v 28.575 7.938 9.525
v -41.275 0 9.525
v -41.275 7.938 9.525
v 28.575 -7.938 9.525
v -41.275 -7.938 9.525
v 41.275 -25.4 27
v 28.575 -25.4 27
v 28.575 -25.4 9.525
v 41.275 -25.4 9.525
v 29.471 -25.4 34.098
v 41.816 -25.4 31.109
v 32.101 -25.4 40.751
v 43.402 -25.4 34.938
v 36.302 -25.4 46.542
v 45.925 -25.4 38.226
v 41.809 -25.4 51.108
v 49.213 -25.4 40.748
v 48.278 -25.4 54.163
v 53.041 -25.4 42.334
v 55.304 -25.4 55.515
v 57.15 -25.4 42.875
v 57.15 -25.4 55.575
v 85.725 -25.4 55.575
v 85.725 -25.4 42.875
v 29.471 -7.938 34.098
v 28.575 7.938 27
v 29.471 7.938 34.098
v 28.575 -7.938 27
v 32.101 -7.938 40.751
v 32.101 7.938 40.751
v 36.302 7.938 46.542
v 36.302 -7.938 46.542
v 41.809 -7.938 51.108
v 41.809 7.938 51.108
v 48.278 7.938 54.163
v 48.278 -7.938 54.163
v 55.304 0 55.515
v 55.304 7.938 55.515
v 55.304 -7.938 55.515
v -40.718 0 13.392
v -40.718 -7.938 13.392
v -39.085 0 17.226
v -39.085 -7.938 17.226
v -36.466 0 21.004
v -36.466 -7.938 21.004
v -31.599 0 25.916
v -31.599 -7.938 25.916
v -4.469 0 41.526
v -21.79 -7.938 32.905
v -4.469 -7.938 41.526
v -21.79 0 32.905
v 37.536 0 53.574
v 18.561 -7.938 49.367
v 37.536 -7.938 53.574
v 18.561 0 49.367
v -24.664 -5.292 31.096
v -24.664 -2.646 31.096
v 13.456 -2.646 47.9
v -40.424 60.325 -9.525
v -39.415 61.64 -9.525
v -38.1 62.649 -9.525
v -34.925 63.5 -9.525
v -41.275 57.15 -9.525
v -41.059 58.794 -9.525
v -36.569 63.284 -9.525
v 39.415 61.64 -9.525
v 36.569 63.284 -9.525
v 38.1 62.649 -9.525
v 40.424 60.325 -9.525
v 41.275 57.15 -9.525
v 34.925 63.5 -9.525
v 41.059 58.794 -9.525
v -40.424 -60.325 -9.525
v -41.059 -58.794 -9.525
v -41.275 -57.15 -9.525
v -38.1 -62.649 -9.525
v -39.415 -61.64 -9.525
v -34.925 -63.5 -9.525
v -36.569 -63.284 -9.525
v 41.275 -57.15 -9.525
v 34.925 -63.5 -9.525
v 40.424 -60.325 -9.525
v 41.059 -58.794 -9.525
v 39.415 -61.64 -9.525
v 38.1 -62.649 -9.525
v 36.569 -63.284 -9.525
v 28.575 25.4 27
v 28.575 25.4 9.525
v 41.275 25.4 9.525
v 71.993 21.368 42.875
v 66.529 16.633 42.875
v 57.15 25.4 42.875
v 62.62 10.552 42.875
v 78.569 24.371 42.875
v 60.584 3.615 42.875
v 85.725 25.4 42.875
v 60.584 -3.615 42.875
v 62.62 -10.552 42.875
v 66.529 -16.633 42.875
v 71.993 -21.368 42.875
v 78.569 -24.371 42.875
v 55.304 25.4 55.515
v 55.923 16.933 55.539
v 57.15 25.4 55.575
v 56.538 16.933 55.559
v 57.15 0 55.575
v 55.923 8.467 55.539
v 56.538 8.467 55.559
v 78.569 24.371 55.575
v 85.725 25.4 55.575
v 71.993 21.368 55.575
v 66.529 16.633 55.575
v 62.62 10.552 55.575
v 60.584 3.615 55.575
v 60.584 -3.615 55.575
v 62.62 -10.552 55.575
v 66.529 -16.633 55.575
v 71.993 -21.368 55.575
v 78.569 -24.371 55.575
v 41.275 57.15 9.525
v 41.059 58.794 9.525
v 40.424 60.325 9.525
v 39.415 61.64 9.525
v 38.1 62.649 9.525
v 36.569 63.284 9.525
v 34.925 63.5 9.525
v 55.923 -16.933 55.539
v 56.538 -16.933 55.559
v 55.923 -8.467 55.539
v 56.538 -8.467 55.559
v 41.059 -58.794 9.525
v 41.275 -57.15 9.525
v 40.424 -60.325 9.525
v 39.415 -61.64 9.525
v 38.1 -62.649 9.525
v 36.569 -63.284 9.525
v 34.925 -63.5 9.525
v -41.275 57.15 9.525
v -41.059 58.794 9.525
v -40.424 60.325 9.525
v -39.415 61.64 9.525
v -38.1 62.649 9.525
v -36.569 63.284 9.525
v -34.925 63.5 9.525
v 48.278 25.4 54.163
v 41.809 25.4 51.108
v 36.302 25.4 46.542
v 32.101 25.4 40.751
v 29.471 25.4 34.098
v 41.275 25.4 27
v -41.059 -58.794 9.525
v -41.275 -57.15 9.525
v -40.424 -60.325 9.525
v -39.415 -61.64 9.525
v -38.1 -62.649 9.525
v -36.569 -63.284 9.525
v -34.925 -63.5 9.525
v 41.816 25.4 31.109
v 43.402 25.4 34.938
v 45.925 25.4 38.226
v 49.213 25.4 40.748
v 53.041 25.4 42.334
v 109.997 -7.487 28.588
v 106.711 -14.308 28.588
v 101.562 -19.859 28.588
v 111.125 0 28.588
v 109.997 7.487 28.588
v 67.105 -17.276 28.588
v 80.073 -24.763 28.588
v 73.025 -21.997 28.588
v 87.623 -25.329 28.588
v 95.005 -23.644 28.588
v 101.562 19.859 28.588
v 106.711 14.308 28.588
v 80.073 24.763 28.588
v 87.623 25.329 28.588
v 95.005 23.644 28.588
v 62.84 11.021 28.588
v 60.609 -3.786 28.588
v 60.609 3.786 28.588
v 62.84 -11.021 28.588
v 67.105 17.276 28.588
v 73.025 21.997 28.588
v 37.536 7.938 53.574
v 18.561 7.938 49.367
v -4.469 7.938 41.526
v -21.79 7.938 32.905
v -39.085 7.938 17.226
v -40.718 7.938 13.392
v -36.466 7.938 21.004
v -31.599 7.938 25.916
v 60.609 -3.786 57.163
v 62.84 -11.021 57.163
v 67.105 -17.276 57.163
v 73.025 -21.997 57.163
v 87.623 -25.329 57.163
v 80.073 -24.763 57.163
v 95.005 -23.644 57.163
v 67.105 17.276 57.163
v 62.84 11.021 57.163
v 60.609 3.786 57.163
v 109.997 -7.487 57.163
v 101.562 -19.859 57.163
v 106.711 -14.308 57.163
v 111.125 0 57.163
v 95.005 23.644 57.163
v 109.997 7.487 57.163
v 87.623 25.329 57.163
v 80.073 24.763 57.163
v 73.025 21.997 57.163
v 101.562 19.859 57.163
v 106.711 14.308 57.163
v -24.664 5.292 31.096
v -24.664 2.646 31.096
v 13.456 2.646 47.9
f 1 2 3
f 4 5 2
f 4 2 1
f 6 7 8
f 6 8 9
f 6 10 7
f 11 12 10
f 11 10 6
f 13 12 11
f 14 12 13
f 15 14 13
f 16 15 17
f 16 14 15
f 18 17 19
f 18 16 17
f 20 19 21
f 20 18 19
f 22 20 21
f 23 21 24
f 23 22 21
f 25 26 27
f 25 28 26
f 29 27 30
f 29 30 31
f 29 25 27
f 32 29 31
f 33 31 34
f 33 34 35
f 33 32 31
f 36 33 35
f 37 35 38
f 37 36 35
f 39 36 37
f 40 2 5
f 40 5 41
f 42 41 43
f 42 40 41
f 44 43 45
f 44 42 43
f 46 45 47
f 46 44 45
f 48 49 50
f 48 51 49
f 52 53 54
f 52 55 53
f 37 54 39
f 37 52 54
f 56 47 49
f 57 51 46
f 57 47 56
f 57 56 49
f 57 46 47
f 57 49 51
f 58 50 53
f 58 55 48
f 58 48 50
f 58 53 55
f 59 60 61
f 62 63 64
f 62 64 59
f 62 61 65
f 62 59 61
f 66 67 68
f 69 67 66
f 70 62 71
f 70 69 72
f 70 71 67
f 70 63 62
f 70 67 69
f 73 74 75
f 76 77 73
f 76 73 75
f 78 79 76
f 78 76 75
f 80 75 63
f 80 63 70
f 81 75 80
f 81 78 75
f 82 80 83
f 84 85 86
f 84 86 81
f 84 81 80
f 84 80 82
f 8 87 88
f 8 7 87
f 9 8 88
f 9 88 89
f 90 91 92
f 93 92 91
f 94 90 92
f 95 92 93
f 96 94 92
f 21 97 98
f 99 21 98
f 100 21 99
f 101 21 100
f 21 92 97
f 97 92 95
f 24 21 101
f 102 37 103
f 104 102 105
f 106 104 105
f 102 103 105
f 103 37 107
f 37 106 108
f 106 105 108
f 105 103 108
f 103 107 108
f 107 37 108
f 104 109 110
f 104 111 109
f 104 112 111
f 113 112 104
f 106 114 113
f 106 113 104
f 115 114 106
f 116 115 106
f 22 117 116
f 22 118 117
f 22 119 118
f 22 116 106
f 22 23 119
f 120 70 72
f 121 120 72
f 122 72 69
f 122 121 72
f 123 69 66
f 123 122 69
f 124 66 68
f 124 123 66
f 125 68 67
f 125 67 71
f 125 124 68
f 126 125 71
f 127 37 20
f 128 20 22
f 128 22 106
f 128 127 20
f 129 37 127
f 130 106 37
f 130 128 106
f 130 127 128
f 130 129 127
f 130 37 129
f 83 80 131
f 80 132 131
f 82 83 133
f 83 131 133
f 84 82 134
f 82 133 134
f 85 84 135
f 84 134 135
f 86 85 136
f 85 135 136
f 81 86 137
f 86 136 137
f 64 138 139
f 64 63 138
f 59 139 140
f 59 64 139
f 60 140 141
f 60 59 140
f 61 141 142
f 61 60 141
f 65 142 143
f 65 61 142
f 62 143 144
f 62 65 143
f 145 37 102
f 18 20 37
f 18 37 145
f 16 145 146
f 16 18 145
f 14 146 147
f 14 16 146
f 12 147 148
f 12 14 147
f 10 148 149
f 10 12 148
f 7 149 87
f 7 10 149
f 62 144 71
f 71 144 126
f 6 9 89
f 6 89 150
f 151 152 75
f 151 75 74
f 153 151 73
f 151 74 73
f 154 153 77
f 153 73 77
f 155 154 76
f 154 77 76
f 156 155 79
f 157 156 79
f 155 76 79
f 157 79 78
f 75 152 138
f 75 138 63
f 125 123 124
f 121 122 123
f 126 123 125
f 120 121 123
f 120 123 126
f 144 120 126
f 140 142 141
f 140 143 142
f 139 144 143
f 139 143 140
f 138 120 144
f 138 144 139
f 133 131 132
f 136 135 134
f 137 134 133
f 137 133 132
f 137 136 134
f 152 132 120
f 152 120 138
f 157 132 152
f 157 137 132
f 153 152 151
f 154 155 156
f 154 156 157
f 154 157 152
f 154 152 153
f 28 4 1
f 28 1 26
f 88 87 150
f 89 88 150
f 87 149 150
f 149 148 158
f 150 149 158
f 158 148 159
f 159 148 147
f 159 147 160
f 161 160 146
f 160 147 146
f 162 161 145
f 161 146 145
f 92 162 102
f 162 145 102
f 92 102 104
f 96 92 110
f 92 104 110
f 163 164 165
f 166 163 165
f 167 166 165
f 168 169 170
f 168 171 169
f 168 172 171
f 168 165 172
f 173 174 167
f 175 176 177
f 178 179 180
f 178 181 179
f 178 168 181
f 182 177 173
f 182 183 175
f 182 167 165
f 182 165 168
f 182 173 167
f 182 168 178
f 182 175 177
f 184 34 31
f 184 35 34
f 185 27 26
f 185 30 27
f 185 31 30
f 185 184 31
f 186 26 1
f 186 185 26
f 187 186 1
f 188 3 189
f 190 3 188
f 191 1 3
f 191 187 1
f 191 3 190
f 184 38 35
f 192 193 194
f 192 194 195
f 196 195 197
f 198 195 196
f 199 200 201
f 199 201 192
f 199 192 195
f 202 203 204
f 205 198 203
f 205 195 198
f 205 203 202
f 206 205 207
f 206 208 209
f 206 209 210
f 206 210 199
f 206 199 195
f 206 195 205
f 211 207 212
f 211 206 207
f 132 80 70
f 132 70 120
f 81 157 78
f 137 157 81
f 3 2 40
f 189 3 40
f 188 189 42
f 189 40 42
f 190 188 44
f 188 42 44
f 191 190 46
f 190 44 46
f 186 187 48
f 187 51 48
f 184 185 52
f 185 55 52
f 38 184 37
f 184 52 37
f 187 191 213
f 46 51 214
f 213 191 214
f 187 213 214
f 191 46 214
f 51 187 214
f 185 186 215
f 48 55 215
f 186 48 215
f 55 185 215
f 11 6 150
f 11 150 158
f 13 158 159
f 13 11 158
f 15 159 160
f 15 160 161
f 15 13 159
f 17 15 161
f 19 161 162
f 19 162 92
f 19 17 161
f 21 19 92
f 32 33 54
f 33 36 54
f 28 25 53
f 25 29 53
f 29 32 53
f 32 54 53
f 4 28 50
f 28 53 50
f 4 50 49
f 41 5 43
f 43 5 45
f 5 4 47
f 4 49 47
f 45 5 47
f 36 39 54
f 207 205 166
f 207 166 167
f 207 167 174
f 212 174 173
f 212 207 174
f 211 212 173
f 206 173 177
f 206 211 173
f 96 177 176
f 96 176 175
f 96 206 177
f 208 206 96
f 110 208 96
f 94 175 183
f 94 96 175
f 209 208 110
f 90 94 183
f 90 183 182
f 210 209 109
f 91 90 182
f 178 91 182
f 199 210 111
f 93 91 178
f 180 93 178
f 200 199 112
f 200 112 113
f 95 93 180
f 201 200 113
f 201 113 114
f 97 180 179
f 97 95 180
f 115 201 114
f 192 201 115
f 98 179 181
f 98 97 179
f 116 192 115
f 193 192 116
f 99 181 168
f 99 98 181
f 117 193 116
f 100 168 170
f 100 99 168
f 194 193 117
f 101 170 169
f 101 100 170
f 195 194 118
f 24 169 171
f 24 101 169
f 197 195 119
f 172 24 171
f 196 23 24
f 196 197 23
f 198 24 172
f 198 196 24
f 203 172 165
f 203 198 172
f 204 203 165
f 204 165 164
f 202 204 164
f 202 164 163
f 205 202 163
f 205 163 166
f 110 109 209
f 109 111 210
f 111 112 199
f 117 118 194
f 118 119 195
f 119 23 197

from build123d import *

# Parameters (mm, degrees)
F1_DEPTH = 63.5
F0_W     = 25.4
F0_H     = 12.7
F2_DEPTH = 25.4
F3_DEPTH = 7.9375
F5_R     = 6.35


with BuildPart() as f1:
    # F0 (on Front) → F1 (new body, symmetric)
    with BuildSketch(Plane.XZ):
        Polygon((28.575, 9.525), (-41.275, 9.525), (-41.275, -9.525), (41.275, -9.525), (41.275, 9.525), align=None)
    extrude(amount=F1_DEPTH, both=True)

    # F5
    f5_edges = [f1.edges().sort_by_distance(p)[0] for p in [
        (41.275, -63.5, 0),
        (41.275, 63.5, 0),
        (-41.275, -63.5, 0),
        (-41.275, 63.5, 0),
    ]]
    fillet(f5_edges, radius=F5_R)


with BuildPart() as f2:
    # F0 (on Front) → F2 (new body, symmetric)
    with BuildSketch(Plane.XZ):
        with BuildLine():
            Line((28.575, 27.0002), (28.575, 9.525))
            Line((28.575, 9.525), (41.275, 9.525))
            Line((41.275, 9.525), (41.275, 27.0002))
            ThreePointArc((41.275, 27.0002), (45.9246798487, 38.2255201513), (57.15, 42.8752))
            Line((57.15, 42.8752), (60.325, 42.8752))
            Line((60.325, 42.8752), (60.325, 55.5752))
            Line((60.325, 55.5752), (57.15, 55.5752))
            add(Edge.make_bspline(
                [(55.3036855907, 55.515489725), (55.9249396968, 55.5409407223), (56.5404963651, 55.560873618), (57.15, 55.5752)],
                knots=[106.9073705279, 106.9073705279, 106.9073705279, 106.9073705279, 108.6650888972, 108.6650888972, 108.6650888972, 108.6650888972], degree=3))
            ThreePointArc((55.3036855907, 55.515489725), (36.3018698771, 46.5421061347), (28.575, 27.0002))
        make_face()
        with Locations((73.025, 49.2252)):
            Rectangle(F0_W, F0_H)
    extrude(amount=F2_DEPTH, both=True)

    # F0 (on Front) → F4 (revolve)
    with BuildSketch(Plane.XZ):
        Polygon((85.725, 57.1627), (85.725, 55.5752), (85.725, 42.8752), (85.725, 28.5877), (111.125, 28.5877), (111.125, 57.1627), align=None)
    revolve(axis=Axis((85.725, 0, 42.8752), (0, 0, 1)))


with BuildPart() as f3:
    # F0 (on Front) → F3 (new body, symmetric)
    with BuildSketch(Plane.XZ):
        with BuildLine():
            add(Edge.make_bspline(
                [(-41.275, 9.525), (-41.344135521, 32.0065654019), (17.5179719771, 53.9675175093), (55.3036855907, 55.515489725)],
                knots=[0, 0, 0, 0, 106.9073705279, 106.9073705279, 106.9073705279, 106.9073705279], degree=3))
            Line((-41.275, 9.525), (28.575, 9.525))
            Line((28.575, 9.525), (28.575, 27.0002))
            ThreePointArc((28.575, 27.0002), (36.3018698771, 46.5421061347), (55.3036855907, 55.515489725))
        make_face()
    extrude(amount=F3_DEPTH, both=True)


solid = Compound([f1.part, f2.part, f3.part])
